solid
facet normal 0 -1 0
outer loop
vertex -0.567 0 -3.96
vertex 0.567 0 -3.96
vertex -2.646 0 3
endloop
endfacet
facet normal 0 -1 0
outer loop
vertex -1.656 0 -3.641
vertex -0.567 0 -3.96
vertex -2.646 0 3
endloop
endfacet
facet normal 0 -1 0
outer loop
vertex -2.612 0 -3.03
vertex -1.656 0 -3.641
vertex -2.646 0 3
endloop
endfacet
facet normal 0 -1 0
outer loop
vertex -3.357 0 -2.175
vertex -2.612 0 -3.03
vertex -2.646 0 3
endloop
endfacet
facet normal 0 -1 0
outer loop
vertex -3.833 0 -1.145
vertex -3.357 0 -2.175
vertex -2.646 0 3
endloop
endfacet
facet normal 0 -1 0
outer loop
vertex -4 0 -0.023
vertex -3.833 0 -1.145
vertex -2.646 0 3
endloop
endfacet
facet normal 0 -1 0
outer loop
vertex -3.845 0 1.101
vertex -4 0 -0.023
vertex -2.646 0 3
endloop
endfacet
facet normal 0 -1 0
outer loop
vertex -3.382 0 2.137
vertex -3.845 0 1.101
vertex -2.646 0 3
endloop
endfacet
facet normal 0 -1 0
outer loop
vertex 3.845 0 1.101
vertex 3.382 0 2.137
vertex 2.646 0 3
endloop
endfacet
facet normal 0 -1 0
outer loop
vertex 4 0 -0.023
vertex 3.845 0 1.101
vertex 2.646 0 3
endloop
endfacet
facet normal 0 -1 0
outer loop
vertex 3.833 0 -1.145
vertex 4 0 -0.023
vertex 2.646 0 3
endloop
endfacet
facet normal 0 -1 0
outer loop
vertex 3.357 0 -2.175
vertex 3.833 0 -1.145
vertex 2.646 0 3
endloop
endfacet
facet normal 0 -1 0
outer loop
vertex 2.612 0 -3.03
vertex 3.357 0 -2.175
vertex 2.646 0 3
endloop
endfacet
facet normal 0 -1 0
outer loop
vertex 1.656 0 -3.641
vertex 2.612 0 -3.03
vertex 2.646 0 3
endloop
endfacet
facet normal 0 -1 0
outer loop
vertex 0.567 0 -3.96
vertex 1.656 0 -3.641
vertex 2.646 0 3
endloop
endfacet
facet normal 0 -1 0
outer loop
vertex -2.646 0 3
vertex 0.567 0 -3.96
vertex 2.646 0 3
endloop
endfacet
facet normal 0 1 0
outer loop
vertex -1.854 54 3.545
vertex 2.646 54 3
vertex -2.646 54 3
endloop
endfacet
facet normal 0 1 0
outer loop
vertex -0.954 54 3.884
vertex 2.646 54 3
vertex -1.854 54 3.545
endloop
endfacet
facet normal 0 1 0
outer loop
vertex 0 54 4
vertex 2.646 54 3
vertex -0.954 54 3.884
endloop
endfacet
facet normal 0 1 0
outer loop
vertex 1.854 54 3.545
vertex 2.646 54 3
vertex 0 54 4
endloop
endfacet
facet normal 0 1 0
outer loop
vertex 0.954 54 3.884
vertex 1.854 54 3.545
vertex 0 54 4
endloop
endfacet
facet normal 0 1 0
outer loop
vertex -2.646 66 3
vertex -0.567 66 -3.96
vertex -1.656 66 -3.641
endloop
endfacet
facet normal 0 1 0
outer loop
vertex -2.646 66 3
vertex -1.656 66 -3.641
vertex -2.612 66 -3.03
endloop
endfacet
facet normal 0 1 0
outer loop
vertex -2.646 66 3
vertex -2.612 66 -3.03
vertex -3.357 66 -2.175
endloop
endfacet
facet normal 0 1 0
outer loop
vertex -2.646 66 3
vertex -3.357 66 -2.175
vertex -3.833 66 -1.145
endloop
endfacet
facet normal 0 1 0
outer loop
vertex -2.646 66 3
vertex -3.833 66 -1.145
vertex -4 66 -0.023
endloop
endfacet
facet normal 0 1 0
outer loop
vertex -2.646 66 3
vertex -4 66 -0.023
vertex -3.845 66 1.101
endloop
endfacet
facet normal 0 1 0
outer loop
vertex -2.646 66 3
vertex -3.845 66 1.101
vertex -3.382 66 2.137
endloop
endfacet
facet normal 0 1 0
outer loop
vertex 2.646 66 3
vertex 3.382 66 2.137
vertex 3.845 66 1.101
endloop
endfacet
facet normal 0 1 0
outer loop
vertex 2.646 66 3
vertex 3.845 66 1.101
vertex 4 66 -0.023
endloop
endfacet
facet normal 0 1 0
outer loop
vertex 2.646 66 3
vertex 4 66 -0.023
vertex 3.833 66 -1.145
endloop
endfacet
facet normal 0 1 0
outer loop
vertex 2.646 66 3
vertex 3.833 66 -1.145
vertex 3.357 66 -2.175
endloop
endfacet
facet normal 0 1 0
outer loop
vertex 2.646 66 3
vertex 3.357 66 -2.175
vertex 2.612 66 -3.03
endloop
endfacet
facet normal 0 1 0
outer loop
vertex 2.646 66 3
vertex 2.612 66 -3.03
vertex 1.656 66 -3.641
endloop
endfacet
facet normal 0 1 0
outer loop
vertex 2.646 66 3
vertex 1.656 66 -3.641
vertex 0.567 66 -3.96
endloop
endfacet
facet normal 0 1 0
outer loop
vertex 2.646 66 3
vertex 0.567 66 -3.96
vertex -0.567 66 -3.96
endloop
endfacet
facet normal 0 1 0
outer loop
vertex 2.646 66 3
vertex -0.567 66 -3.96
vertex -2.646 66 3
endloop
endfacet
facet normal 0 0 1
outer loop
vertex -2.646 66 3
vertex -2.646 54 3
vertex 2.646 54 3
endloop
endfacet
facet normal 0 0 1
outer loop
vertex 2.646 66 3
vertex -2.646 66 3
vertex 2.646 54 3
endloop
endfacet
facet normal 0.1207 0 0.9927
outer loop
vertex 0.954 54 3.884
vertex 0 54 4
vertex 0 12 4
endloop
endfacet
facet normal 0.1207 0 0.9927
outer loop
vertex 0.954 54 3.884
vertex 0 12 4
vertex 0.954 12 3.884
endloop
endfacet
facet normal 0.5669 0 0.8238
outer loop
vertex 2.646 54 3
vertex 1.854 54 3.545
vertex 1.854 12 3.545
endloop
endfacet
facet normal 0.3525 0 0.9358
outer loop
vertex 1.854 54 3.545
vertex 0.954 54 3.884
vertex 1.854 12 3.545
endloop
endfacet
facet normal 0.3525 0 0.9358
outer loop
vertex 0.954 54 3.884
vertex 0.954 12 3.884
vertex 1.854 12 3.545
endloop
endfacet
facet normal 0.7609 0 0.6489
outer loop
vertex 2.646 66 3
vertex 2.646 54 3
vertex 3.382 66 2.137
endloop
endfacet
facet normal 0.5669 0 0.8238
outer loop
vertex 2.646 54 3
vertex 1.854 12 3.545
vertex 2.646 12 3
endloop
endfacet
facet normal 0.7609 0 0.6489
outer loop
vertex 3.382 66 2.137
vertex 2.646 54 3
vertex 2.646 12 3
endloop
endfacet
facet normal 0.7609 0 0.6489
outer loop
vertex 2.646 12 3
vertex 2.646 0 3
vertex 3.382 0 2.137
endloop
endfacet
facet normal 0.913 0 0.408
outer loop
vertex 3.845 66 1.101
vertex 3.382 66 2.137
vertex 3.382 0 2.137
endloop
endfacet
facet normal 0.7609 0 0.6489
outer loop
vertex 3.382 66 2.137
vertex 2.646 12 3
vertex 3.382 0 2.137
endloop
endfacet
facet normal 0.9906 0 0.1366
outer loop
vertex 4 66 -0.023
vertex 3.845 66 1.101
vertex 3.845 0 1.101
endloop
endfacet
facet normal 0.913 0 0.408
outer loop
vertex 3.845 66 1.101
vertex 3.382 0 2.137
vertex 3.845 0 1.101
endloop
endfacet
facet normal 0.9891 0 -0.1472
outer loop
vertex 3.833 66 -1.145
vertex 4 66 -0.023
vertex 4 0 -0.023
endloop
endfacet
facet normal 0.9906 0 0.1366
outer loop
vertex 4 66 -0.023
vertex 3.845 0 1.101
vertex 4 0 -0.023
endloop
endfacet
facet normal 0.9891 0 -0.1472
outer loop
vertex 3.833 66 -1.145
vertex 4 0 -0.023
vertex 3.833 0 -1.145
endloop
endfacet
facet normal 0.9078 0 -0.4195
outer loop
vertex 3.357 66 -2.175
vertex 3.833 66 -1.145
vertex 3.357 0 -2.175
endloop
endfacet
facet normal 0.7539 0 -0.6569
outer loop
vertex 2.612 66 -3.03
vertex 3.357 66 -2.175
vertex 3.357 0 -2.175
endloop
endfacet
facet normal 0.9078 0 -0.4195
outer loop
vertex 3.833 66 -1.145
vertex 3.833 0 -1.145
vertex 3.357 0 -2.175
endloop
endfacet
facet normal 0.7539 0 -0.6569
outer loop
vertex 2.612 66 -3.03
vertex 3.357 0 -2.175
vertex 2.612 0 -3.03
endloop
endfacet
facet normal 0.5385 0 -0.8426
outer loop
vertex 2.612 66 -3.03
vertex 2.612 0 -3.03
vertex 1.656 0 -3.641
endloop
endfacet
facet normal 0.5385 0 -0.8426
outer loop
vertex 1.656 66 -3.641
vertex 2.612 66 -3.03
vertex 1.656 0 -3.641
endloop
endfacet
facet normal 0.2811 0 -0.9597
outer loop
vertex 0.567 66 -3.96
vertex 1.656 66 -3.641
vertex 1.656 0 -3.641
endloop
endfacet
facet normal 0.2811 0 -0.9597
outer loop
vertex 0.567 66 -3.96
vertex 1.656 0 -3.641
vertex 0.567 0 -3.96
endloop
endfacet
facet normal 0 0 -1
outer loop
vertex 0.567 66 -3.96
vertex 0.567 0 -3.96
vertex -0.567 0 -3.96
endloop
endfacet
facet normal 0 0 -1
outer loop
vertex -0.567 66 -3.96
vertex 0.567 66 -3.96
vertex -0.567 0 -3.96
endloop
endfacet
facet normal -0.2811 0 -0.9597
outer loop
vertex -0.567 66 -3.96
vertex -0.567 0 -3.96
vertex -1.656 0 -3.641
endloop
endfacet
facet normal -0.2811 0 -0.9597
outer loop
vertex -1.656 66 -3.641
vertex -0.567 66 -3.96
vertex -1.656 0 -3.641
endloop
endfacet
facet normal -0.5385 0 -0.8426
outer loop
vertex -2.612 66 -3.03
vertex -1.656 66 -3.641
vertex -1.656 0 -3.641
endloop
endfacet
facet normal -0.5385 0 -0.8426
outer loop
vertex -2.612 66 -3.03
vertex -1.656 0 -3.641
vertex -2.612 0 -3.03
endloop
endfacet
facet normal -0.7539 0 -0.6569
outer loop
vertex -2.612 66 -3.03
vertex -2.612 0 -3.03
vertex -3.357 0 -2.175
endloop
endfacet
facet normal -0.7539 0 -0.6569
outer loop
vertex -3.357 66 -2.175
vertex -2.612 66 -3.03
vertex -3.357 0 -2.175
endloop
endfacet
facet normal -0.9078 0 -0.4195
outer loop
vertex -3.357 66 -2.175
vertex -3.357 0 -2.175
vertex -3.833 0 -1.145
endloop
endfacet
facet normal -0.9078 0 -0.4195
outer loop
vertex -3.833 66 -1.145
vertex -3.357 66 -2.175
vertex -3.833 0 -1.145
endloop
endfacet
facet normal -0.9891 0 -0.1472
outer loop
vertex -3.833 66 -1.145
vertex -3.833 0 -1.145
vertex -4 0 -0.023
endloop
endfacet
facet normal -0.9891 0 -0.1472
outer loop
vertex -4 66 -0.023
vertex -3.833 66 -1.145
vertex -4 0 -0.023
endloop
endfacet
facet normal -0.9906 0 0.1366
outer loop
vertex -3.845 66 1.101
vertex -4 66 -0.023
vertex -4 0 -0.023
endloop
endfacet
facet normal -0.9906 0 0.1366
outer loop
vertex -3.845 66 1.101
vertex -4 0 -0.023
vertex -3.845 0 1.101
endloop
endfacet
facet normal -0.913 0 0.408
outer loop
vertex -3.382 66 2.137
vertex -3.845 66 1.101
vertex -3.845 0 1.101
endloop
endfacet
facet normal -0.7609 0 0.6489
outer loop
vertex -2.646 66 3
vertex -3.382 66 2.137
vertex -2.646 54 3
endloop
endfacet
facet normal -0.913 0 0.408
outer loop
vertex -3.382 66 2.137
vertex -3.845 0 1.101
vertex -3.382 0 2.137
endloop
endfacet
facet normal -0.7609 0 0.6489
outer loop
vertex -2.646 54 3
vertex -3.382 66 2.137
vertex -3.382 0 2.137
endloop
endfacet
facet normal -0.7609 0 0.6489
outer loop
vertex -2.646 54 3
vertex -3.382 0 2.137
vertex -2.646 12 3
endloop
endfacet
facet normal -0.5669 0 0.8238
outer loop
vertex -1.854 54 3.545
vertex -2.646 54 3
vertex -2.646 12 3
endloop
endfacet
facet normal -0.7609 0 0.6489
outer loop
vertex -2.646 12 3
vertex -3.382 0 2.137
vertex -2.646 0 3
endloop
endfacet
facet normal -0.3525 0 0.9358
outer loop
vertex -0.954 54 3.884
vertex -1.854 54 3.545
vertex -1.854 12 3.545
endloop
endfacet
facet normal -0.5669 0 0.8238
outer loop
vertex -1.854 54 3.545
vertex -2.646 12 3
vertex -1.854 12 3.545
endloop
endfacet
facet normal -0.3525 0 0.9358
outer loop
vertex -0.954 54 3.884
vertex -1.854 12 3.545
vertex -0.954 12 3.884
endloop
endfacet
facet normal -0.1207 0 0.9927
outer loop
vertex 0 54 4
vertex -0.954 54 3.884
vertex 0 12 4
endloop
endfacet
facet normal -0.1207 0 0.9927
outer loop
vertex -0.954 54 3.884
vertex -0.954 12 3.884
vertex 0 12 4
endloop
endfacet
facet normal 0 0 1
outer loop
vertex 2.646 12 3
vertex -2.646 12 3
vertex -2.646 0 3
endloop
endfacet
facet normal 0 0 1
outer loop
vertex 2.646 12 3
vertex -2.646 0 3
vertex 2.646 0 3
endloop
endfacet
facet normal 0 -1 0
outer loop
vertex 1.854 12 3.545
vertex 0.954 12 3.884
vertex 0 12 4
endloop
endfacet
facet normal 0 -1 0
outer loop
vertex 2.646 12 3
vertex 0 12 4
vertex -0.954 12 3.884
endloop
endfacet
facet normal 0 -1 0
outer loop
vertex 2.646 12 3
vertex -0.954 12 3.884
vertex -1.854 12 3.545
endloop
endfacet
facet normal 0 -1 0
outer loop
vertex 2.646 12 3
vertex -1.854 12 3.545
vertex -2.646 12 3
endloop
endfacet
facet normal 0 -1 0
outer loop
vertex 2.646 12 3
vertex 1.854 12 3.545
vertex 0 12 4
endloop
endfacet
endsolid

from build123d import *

# Parameters (mm, degrees)
SKETCH2_R               = 4
BOSS_EXTRUDE2_DEPTH     = 66
CUT_EXTRUDE1_START      = -12
CUT_EXTRUDE1_DEPTH      = 12
CUT_EXTRUDE3_DEPTH      = 67.241980647
CUT_EXTRUDE3_DEPTH_BACK = 12


with BuildPart() as part:
    # Sketch2 → Boss-Extrude2 (new body)
    with BuildSketch(Plane(origin=(0, 0, 0), x_dir=(1, 0, 0), z_dir=(0, 1, 0))):
        with Locations(Location((0, 0, 0), (0, 0, 270))):
            Circle(SKETCH2_R)
    extrude(amount=BOSS_EXTRUDE2_DEPTH)

    # Sketch3 → Cut-Extrude1 (cut)
    with BuildSketch(Plane(origin=(0, 66, 0), x_dir=(1, 0, 0), z_dir=(0, 1, 0)).offset(CUT_EXTRUDE1_START)):
        with BuildLine():
            Line((-2.645751311, -3), (2.645751311, -3))
            ThreePointArc((2.645751311, -3), (0, -4), (-2.645751311, -3))
        make_face()
    extrude(amount=CUT_EXTRUDE1_DEPTH, mode=Mode.SUBTRACT)

    # Sketch4 → Cut-Extrude3 (cut, two sides: drawn at the far end of the back side and taken through both)
    with BuildSketch(Plane.XZ.offset(-CUT_EXTRUDE3_DEPTH_BACK)):
        with BuildLine():
            ThreePointArc((2.645751311, 3), (0, 4), (-2.645751311, 3))
            Line((-2.645751311, 3), (2.645751311, 3))
        make_face()
    extrude(amount=CUT_EXTRUDE3_DEPTH + CUT_EXTRUDE3_DEPTH_BACK, mode=Mode.SUBTRACT)


solid = part.part
